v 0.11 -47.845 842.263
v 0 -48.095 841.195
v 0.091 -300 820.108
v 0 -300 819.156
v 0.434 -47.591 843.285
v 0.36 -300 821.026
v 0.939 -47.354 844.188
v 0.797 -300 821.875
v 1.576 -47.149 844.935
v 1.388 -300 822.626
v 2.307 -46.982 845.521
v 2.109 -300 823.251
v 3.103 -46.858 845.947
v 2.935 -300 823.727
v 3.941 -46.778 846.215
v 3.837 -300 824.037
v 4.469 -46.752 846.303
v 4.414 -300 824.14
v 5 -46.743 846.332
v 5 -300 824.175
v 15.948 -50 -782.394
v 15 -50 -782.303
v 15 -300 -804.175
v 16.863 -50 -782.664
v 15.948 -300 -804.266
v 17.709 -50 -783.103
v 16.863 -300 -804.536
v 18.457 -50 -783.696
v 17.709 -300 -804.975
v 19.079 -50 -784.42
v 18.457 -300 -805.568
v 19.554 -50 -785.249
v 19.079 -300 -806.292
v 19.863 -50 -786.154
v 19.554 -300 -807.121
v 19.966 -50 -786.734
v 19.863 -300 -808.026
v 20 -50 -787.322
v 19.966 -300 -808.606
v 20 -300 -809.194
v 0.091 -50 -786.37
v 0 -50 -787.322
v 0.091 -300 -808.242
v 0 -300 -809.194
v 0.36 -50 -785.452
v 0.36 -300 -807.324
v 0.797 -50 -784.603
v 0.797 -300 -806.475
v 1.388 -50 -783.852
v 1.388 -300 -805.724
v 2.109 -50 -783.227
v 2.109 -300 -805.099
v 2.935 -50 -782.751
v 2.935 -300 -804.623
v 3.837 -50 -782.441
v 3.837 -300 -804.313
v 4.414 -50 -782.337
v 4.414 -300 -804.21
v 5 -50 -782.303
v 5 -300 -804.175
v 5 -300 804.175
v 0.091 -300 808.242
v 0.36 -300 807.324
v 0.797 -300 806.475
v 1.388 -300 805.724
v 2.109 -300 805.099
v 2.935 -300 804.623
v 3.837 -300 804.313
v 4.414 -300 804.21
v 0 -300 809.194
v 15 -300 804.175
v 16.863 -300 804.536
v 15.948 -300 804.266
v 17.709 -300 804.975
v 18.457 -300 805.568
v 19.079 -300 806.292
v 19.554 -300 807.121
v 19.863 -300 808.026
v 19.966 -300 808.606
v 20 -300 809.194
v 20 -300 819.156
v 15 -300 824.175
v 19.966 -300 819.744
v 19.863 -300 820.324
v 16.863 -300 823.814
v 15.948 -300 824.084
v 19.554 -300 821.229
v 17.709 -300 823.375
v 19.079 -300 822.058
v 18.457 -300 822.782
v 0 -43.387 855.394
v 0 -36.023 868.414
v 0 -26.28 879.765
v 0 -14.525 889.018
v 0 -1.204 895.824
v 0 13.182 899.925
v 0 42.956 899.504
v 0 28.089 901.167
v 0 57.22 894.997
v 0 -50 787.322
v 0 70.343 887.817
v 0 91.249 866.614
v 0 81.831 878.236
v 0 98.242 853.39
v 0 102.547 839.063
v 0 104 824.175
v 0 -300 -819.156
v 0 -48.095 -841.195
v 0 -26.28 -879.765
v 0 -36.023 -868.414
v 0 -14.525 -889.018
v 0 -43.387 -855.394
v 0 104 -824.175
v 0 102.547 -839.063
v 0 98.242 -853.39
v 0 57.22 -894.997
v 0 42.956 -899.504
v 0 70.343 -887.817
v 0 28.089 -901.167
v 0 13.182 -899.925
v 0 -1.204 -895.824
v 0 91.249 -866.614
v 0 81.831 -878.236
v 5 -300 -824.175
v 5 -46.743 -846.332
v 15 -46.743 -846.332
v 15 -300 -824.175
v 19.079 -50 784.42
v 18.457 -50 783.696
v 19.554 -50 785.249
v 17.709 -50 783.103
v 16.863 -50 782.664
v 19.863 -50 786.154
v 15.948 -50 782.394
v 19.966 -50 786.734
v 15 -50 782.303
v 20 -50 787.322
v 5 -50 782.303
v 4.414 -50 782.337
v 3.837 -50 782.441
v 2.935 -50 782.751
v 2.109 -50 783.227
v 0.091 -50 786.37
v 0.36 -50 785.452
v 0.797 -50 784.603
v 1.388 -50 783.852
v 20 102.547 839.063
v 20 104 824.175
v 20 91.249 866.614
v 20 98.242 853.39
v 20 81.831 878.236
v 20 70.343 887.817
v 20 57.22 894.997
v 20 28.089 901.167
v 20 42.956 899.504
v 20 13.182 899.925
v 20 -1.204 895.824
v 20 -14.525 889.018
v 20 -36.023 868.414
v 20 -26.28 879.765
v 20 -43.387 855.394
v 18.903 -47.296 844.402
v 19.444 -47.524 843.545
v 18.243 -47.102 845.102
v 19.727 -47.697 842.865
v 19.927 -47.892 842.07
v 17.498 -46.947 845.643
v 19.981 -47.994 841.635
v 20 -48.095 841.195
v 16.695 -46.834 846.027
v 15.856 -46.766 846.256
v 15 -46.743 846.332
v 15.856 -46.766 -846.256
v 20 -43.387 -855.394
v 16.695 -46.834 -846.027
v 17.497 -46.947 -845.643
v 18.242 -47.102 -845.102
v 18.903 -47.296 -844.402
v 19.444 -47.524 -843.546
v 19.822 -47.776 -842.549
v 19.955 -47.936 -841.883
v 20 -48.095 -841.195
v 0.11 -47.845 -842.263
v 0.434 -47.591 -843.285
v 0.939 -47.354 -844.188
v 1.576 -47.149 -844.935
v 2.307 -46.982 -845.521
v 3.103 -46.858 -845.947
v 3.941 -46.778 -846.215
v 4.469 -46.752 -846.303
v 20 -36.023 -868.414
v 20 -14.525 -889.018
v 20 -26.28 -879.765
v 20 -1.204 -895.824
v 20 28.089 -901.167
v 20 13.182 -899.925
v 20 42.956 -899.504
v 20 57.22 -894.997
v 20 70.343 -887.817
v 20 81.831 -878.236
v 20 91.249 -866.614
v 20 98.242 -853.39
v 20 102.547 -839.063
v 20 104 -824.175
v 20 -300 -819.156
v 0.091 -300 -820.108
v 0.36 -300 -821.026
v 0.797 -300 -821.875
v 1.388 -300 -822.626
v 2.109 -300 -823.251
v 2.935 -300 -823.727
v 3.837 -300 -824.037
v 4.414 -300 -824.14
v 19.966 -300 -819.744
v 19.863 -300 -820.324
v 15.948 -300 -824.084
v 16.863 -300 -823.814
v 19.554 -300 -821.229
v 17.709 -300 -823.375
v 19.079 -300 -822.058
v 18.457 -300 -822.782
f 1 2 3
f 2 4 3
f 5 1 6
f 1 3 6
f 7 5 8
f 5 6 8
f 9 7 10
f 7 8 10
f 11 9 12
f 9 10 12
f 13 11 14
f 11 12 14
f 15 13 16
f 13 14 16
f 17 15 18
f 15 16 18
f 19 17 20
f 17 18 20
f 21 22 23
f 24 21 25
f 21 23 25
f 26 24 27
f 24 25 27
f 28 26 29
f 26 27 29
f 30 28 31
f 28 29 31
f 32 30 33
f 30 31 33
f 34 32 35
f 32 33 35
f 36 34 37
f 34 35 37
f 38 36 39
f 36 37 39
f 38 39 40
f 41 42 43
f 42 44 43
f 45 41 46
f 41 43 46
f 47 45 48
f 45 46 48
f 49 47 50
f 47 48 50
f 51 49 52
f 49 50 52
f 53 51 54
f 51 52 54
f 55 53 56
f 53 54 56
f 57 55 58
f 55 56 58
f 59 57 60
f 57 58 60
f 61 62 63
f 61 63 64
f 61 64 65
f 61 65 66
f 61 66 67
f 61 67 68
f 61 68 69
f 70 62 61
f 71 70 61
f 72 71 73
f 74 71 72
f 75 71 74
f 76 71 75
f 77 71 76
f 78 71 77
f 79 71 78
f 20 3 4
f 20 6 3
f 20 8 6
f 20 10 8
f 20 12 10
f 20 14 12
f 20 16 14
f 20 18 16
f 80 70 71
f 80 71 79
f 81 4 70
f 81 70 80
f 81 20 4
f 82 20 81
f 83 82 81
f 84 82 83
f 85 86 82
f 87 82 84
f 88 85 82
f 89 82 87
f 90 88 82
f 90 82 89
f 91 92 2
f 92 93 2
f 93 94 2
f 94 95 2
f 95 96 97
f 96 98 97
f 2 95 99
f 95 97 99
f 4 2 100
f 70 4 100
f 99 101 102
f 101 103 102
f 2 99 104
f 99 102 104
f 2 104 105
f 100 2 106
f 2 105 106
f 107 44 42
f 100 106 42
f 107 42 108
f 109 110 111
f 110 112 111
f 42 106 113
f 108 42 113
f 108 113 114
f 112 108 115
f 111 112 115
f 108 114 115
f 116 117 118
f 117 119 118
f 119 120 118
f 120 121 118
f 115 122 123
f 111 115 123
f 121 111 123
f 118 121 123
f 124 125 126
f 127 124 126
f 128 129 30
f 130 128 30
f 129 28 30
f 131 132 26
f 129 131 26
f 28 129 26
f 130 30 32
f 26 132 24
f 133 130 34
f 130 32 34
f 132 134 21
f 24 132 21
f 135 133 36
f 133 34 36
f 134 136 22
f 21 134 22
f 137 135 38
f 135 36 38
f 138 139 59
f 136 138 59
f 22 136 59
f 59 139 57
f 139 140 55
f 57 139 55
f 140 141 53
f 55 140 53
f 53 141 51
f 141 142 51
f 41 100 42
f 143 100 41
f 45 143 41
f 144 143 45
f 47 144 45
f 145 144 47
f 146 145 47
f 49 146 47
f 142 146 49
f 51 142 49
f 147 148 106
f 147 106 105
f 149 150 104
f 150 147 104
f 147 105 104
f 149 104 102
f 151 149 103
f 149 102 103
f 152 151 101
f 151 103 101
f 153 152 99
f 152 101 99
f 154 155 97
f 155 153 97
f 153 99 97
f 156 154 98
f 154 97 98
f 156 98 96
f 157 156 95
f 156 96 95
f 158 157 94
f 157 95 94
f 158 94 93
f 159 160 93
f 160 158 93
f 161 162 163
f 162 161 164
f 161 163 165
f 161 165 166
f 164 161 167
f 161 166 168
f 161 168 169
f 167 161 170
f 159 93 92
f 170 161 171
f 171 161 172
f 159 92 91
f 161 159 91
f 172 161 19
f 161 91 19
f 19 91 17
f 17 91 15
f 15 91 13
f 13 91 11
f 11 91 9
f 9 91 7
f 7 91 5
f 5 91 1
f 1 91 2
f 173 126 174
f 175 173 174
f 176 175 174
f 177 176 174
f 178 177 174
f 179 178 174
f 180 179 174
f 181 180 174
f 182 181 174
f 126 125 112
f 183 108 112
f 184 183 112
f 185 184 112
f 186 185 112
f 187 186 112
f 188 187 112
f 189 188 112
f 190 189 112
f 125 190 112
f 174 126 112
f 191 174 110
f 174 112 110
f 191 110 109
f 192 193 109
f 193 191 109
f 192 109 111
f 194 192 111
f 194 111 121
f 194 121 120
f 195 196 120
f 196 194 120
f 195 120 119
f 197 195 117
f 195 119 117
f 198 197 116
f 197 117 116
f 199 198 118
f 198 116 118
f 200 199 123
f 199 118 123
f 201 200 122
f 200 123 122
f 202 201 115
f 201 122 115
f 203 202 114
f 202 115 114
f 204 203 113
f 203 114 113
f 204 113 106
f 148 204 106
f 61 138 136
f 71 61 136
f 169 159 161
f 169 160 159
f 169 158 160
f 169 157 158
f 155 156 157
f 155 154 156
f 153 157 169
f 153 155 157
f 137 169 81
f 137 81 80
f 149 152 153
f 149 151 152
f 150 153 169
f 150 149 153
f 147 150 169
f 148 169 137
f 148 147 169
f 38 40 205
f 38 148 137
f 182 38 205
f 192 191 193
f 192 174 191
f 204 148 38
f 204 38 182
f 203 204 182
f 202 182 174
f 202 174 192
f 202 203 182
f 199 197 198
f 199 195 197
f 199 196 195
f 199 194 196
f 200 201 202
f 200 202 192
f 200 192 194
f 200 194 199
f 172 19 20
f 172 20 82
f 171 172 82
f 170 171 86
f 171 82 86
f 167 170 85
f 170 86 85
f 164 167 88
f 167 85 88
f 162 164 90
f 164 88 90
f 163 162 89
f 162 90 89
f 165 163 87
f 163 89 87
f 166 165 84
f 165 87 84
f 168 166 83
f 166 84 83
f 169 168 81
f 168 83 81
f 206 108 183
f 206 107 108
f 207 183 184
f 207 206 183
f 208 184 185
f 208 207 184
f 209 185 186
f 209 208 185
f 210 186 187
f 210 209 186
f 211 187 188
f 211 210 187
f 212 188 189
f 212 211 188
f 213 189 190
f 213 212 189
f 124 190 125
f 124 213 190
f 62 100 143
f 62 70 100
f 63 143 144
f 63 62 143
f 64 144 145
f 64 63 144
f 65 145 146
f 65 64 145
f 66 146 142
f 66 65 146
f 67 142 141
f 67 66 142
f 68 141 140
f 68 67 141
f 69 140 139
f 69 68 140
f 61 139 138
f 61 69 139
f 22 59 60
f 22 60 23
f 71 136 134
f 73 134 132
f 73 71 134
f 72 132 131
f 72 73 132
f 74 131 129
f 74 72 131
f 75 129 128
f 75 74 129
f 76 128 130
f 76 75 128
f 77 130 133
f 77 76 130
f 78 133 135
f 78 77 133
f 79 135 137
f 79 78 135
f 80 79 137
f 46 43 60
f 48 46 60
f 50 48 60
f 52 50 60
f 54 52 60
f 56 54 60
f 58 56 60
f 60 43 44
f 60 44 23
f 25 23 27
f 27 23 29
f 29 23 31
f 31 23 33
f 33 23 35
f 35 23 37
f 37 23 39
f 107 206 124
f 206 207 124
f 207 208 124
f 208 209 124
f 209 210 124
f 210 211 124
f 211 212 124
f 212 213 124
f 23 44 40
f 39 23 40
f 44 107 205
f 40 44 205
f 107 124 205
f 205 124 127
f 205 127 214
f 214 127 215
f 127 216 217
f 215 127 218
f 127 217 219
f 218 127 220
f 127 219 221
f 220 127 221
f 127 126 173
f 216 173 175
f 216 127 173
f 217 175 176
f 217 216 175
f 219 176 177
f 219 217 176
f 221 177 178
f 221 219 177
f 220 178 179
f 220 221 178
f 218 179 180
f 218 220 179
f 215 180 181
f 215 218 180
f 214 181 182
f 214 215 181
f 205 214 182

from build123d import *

# Parameters (mm, degrees)
BOSS_EXTRUDE1_DEPTH       = 20
SKETCH2_W                 = 20
SKETCH2_H                 = 20
BOSS_EXTRUDE2_DEPTH       = 250
DRAFT5_ANGLE              = 5
FILLET1_R                 = 5
DRAFT5_OF_MIRROR2_2_ANGLE = 5
FILLET1_OF_MIRROR2_R      = 5


with BuildPart() as part:
    # Sketch1 → Boss-Extrude1 (new body)
    with BuildSketch(Plane(origin=(0, 0, 0), x_dir=(0, 0, -1), z_dir=(1, 0, 0))):
        with BuildLine():
            Line((-824.175, -50), (824.175, -50))
            ThreePointArc((824.175, -50), (901.175, 27), (824.175, 104))
            Line((824.175, 104), (-824.175, 104))
            ThreePointArc((-824.175, 104), (-901.175, 27), (-824.175, -50))
        make_face()
    extrude(amount=BOSS_EXTRUDE1_DEPTH)

    # Sketch2 → Boss-Extrude2 (add)
    with BuildSketch(Plane.XZ.offset(50)):
        with Locations((10, 814.175)):
            Rectangle(SKETCH2_W, SKETCH2_H)
    boss_extrude2 = extrude(amount=BOSS_EXTRUDE2_DEPTH)

    # Draft5
    draft5_faces = [part.faces().sort_by_distance(p)[0] for p in [
        (10, -175, 824.175),
        (10, -175, 804.175),
    ]]
    draft(draft5_faces, Plane(origin=(0, -300, 0), x_dir=(0, 0, -1), z_dir=(0, -1, 0)), DRAFT5_ANGLE)

    # Fillet1
    fillet1_edges = [part.edges().sort_by_distance(p)[0] for p in [
        (0, -173.371611905, 835.253548439),
        (0, -175, 793.238917059),
        (20, -175, 793.238917059),
        (20, -173.371611905, 835.253548439),
    ]]
    fillet(fillet1_edges, radius=FILLET1_R)

    # Mirror2: Boss-Extrude2 across plane
    add(boss_extrude2.mirror(Plane.XY))

    # Draft5 of Mirror2 2
    draft5_of_mirror2_2_faces = [part.faces().sort_by_distance(p)[0] for p in [
        (10, -175, -824.175),
        (10, -175, -804.175),
    ]]
    draft(draft5_of_mirror2_2_faces, Plane(origin=(0, -300, 0), x_dir=(0, 0, 1), z_dir=(0, -1, 0)), DRAFT5_OF_MIRROR2_2_ANGLE)

    # Fillet1 of Mirror2
    fillet1_of_mirror2_edges = [part.edges().sort_by_distance(p)[0] for p in [
        (0, -173.371611905, -835.253548439),
        (0, -175, -793.238917059),
        (20, -175, -793.238917059),
        (20, -173.371611905, -835.253548439),
    ]]
    fillet(fillet1_of_mirror2_edges, radius=FILLET1_OF_MIRROR2_R)


solid = part.part
